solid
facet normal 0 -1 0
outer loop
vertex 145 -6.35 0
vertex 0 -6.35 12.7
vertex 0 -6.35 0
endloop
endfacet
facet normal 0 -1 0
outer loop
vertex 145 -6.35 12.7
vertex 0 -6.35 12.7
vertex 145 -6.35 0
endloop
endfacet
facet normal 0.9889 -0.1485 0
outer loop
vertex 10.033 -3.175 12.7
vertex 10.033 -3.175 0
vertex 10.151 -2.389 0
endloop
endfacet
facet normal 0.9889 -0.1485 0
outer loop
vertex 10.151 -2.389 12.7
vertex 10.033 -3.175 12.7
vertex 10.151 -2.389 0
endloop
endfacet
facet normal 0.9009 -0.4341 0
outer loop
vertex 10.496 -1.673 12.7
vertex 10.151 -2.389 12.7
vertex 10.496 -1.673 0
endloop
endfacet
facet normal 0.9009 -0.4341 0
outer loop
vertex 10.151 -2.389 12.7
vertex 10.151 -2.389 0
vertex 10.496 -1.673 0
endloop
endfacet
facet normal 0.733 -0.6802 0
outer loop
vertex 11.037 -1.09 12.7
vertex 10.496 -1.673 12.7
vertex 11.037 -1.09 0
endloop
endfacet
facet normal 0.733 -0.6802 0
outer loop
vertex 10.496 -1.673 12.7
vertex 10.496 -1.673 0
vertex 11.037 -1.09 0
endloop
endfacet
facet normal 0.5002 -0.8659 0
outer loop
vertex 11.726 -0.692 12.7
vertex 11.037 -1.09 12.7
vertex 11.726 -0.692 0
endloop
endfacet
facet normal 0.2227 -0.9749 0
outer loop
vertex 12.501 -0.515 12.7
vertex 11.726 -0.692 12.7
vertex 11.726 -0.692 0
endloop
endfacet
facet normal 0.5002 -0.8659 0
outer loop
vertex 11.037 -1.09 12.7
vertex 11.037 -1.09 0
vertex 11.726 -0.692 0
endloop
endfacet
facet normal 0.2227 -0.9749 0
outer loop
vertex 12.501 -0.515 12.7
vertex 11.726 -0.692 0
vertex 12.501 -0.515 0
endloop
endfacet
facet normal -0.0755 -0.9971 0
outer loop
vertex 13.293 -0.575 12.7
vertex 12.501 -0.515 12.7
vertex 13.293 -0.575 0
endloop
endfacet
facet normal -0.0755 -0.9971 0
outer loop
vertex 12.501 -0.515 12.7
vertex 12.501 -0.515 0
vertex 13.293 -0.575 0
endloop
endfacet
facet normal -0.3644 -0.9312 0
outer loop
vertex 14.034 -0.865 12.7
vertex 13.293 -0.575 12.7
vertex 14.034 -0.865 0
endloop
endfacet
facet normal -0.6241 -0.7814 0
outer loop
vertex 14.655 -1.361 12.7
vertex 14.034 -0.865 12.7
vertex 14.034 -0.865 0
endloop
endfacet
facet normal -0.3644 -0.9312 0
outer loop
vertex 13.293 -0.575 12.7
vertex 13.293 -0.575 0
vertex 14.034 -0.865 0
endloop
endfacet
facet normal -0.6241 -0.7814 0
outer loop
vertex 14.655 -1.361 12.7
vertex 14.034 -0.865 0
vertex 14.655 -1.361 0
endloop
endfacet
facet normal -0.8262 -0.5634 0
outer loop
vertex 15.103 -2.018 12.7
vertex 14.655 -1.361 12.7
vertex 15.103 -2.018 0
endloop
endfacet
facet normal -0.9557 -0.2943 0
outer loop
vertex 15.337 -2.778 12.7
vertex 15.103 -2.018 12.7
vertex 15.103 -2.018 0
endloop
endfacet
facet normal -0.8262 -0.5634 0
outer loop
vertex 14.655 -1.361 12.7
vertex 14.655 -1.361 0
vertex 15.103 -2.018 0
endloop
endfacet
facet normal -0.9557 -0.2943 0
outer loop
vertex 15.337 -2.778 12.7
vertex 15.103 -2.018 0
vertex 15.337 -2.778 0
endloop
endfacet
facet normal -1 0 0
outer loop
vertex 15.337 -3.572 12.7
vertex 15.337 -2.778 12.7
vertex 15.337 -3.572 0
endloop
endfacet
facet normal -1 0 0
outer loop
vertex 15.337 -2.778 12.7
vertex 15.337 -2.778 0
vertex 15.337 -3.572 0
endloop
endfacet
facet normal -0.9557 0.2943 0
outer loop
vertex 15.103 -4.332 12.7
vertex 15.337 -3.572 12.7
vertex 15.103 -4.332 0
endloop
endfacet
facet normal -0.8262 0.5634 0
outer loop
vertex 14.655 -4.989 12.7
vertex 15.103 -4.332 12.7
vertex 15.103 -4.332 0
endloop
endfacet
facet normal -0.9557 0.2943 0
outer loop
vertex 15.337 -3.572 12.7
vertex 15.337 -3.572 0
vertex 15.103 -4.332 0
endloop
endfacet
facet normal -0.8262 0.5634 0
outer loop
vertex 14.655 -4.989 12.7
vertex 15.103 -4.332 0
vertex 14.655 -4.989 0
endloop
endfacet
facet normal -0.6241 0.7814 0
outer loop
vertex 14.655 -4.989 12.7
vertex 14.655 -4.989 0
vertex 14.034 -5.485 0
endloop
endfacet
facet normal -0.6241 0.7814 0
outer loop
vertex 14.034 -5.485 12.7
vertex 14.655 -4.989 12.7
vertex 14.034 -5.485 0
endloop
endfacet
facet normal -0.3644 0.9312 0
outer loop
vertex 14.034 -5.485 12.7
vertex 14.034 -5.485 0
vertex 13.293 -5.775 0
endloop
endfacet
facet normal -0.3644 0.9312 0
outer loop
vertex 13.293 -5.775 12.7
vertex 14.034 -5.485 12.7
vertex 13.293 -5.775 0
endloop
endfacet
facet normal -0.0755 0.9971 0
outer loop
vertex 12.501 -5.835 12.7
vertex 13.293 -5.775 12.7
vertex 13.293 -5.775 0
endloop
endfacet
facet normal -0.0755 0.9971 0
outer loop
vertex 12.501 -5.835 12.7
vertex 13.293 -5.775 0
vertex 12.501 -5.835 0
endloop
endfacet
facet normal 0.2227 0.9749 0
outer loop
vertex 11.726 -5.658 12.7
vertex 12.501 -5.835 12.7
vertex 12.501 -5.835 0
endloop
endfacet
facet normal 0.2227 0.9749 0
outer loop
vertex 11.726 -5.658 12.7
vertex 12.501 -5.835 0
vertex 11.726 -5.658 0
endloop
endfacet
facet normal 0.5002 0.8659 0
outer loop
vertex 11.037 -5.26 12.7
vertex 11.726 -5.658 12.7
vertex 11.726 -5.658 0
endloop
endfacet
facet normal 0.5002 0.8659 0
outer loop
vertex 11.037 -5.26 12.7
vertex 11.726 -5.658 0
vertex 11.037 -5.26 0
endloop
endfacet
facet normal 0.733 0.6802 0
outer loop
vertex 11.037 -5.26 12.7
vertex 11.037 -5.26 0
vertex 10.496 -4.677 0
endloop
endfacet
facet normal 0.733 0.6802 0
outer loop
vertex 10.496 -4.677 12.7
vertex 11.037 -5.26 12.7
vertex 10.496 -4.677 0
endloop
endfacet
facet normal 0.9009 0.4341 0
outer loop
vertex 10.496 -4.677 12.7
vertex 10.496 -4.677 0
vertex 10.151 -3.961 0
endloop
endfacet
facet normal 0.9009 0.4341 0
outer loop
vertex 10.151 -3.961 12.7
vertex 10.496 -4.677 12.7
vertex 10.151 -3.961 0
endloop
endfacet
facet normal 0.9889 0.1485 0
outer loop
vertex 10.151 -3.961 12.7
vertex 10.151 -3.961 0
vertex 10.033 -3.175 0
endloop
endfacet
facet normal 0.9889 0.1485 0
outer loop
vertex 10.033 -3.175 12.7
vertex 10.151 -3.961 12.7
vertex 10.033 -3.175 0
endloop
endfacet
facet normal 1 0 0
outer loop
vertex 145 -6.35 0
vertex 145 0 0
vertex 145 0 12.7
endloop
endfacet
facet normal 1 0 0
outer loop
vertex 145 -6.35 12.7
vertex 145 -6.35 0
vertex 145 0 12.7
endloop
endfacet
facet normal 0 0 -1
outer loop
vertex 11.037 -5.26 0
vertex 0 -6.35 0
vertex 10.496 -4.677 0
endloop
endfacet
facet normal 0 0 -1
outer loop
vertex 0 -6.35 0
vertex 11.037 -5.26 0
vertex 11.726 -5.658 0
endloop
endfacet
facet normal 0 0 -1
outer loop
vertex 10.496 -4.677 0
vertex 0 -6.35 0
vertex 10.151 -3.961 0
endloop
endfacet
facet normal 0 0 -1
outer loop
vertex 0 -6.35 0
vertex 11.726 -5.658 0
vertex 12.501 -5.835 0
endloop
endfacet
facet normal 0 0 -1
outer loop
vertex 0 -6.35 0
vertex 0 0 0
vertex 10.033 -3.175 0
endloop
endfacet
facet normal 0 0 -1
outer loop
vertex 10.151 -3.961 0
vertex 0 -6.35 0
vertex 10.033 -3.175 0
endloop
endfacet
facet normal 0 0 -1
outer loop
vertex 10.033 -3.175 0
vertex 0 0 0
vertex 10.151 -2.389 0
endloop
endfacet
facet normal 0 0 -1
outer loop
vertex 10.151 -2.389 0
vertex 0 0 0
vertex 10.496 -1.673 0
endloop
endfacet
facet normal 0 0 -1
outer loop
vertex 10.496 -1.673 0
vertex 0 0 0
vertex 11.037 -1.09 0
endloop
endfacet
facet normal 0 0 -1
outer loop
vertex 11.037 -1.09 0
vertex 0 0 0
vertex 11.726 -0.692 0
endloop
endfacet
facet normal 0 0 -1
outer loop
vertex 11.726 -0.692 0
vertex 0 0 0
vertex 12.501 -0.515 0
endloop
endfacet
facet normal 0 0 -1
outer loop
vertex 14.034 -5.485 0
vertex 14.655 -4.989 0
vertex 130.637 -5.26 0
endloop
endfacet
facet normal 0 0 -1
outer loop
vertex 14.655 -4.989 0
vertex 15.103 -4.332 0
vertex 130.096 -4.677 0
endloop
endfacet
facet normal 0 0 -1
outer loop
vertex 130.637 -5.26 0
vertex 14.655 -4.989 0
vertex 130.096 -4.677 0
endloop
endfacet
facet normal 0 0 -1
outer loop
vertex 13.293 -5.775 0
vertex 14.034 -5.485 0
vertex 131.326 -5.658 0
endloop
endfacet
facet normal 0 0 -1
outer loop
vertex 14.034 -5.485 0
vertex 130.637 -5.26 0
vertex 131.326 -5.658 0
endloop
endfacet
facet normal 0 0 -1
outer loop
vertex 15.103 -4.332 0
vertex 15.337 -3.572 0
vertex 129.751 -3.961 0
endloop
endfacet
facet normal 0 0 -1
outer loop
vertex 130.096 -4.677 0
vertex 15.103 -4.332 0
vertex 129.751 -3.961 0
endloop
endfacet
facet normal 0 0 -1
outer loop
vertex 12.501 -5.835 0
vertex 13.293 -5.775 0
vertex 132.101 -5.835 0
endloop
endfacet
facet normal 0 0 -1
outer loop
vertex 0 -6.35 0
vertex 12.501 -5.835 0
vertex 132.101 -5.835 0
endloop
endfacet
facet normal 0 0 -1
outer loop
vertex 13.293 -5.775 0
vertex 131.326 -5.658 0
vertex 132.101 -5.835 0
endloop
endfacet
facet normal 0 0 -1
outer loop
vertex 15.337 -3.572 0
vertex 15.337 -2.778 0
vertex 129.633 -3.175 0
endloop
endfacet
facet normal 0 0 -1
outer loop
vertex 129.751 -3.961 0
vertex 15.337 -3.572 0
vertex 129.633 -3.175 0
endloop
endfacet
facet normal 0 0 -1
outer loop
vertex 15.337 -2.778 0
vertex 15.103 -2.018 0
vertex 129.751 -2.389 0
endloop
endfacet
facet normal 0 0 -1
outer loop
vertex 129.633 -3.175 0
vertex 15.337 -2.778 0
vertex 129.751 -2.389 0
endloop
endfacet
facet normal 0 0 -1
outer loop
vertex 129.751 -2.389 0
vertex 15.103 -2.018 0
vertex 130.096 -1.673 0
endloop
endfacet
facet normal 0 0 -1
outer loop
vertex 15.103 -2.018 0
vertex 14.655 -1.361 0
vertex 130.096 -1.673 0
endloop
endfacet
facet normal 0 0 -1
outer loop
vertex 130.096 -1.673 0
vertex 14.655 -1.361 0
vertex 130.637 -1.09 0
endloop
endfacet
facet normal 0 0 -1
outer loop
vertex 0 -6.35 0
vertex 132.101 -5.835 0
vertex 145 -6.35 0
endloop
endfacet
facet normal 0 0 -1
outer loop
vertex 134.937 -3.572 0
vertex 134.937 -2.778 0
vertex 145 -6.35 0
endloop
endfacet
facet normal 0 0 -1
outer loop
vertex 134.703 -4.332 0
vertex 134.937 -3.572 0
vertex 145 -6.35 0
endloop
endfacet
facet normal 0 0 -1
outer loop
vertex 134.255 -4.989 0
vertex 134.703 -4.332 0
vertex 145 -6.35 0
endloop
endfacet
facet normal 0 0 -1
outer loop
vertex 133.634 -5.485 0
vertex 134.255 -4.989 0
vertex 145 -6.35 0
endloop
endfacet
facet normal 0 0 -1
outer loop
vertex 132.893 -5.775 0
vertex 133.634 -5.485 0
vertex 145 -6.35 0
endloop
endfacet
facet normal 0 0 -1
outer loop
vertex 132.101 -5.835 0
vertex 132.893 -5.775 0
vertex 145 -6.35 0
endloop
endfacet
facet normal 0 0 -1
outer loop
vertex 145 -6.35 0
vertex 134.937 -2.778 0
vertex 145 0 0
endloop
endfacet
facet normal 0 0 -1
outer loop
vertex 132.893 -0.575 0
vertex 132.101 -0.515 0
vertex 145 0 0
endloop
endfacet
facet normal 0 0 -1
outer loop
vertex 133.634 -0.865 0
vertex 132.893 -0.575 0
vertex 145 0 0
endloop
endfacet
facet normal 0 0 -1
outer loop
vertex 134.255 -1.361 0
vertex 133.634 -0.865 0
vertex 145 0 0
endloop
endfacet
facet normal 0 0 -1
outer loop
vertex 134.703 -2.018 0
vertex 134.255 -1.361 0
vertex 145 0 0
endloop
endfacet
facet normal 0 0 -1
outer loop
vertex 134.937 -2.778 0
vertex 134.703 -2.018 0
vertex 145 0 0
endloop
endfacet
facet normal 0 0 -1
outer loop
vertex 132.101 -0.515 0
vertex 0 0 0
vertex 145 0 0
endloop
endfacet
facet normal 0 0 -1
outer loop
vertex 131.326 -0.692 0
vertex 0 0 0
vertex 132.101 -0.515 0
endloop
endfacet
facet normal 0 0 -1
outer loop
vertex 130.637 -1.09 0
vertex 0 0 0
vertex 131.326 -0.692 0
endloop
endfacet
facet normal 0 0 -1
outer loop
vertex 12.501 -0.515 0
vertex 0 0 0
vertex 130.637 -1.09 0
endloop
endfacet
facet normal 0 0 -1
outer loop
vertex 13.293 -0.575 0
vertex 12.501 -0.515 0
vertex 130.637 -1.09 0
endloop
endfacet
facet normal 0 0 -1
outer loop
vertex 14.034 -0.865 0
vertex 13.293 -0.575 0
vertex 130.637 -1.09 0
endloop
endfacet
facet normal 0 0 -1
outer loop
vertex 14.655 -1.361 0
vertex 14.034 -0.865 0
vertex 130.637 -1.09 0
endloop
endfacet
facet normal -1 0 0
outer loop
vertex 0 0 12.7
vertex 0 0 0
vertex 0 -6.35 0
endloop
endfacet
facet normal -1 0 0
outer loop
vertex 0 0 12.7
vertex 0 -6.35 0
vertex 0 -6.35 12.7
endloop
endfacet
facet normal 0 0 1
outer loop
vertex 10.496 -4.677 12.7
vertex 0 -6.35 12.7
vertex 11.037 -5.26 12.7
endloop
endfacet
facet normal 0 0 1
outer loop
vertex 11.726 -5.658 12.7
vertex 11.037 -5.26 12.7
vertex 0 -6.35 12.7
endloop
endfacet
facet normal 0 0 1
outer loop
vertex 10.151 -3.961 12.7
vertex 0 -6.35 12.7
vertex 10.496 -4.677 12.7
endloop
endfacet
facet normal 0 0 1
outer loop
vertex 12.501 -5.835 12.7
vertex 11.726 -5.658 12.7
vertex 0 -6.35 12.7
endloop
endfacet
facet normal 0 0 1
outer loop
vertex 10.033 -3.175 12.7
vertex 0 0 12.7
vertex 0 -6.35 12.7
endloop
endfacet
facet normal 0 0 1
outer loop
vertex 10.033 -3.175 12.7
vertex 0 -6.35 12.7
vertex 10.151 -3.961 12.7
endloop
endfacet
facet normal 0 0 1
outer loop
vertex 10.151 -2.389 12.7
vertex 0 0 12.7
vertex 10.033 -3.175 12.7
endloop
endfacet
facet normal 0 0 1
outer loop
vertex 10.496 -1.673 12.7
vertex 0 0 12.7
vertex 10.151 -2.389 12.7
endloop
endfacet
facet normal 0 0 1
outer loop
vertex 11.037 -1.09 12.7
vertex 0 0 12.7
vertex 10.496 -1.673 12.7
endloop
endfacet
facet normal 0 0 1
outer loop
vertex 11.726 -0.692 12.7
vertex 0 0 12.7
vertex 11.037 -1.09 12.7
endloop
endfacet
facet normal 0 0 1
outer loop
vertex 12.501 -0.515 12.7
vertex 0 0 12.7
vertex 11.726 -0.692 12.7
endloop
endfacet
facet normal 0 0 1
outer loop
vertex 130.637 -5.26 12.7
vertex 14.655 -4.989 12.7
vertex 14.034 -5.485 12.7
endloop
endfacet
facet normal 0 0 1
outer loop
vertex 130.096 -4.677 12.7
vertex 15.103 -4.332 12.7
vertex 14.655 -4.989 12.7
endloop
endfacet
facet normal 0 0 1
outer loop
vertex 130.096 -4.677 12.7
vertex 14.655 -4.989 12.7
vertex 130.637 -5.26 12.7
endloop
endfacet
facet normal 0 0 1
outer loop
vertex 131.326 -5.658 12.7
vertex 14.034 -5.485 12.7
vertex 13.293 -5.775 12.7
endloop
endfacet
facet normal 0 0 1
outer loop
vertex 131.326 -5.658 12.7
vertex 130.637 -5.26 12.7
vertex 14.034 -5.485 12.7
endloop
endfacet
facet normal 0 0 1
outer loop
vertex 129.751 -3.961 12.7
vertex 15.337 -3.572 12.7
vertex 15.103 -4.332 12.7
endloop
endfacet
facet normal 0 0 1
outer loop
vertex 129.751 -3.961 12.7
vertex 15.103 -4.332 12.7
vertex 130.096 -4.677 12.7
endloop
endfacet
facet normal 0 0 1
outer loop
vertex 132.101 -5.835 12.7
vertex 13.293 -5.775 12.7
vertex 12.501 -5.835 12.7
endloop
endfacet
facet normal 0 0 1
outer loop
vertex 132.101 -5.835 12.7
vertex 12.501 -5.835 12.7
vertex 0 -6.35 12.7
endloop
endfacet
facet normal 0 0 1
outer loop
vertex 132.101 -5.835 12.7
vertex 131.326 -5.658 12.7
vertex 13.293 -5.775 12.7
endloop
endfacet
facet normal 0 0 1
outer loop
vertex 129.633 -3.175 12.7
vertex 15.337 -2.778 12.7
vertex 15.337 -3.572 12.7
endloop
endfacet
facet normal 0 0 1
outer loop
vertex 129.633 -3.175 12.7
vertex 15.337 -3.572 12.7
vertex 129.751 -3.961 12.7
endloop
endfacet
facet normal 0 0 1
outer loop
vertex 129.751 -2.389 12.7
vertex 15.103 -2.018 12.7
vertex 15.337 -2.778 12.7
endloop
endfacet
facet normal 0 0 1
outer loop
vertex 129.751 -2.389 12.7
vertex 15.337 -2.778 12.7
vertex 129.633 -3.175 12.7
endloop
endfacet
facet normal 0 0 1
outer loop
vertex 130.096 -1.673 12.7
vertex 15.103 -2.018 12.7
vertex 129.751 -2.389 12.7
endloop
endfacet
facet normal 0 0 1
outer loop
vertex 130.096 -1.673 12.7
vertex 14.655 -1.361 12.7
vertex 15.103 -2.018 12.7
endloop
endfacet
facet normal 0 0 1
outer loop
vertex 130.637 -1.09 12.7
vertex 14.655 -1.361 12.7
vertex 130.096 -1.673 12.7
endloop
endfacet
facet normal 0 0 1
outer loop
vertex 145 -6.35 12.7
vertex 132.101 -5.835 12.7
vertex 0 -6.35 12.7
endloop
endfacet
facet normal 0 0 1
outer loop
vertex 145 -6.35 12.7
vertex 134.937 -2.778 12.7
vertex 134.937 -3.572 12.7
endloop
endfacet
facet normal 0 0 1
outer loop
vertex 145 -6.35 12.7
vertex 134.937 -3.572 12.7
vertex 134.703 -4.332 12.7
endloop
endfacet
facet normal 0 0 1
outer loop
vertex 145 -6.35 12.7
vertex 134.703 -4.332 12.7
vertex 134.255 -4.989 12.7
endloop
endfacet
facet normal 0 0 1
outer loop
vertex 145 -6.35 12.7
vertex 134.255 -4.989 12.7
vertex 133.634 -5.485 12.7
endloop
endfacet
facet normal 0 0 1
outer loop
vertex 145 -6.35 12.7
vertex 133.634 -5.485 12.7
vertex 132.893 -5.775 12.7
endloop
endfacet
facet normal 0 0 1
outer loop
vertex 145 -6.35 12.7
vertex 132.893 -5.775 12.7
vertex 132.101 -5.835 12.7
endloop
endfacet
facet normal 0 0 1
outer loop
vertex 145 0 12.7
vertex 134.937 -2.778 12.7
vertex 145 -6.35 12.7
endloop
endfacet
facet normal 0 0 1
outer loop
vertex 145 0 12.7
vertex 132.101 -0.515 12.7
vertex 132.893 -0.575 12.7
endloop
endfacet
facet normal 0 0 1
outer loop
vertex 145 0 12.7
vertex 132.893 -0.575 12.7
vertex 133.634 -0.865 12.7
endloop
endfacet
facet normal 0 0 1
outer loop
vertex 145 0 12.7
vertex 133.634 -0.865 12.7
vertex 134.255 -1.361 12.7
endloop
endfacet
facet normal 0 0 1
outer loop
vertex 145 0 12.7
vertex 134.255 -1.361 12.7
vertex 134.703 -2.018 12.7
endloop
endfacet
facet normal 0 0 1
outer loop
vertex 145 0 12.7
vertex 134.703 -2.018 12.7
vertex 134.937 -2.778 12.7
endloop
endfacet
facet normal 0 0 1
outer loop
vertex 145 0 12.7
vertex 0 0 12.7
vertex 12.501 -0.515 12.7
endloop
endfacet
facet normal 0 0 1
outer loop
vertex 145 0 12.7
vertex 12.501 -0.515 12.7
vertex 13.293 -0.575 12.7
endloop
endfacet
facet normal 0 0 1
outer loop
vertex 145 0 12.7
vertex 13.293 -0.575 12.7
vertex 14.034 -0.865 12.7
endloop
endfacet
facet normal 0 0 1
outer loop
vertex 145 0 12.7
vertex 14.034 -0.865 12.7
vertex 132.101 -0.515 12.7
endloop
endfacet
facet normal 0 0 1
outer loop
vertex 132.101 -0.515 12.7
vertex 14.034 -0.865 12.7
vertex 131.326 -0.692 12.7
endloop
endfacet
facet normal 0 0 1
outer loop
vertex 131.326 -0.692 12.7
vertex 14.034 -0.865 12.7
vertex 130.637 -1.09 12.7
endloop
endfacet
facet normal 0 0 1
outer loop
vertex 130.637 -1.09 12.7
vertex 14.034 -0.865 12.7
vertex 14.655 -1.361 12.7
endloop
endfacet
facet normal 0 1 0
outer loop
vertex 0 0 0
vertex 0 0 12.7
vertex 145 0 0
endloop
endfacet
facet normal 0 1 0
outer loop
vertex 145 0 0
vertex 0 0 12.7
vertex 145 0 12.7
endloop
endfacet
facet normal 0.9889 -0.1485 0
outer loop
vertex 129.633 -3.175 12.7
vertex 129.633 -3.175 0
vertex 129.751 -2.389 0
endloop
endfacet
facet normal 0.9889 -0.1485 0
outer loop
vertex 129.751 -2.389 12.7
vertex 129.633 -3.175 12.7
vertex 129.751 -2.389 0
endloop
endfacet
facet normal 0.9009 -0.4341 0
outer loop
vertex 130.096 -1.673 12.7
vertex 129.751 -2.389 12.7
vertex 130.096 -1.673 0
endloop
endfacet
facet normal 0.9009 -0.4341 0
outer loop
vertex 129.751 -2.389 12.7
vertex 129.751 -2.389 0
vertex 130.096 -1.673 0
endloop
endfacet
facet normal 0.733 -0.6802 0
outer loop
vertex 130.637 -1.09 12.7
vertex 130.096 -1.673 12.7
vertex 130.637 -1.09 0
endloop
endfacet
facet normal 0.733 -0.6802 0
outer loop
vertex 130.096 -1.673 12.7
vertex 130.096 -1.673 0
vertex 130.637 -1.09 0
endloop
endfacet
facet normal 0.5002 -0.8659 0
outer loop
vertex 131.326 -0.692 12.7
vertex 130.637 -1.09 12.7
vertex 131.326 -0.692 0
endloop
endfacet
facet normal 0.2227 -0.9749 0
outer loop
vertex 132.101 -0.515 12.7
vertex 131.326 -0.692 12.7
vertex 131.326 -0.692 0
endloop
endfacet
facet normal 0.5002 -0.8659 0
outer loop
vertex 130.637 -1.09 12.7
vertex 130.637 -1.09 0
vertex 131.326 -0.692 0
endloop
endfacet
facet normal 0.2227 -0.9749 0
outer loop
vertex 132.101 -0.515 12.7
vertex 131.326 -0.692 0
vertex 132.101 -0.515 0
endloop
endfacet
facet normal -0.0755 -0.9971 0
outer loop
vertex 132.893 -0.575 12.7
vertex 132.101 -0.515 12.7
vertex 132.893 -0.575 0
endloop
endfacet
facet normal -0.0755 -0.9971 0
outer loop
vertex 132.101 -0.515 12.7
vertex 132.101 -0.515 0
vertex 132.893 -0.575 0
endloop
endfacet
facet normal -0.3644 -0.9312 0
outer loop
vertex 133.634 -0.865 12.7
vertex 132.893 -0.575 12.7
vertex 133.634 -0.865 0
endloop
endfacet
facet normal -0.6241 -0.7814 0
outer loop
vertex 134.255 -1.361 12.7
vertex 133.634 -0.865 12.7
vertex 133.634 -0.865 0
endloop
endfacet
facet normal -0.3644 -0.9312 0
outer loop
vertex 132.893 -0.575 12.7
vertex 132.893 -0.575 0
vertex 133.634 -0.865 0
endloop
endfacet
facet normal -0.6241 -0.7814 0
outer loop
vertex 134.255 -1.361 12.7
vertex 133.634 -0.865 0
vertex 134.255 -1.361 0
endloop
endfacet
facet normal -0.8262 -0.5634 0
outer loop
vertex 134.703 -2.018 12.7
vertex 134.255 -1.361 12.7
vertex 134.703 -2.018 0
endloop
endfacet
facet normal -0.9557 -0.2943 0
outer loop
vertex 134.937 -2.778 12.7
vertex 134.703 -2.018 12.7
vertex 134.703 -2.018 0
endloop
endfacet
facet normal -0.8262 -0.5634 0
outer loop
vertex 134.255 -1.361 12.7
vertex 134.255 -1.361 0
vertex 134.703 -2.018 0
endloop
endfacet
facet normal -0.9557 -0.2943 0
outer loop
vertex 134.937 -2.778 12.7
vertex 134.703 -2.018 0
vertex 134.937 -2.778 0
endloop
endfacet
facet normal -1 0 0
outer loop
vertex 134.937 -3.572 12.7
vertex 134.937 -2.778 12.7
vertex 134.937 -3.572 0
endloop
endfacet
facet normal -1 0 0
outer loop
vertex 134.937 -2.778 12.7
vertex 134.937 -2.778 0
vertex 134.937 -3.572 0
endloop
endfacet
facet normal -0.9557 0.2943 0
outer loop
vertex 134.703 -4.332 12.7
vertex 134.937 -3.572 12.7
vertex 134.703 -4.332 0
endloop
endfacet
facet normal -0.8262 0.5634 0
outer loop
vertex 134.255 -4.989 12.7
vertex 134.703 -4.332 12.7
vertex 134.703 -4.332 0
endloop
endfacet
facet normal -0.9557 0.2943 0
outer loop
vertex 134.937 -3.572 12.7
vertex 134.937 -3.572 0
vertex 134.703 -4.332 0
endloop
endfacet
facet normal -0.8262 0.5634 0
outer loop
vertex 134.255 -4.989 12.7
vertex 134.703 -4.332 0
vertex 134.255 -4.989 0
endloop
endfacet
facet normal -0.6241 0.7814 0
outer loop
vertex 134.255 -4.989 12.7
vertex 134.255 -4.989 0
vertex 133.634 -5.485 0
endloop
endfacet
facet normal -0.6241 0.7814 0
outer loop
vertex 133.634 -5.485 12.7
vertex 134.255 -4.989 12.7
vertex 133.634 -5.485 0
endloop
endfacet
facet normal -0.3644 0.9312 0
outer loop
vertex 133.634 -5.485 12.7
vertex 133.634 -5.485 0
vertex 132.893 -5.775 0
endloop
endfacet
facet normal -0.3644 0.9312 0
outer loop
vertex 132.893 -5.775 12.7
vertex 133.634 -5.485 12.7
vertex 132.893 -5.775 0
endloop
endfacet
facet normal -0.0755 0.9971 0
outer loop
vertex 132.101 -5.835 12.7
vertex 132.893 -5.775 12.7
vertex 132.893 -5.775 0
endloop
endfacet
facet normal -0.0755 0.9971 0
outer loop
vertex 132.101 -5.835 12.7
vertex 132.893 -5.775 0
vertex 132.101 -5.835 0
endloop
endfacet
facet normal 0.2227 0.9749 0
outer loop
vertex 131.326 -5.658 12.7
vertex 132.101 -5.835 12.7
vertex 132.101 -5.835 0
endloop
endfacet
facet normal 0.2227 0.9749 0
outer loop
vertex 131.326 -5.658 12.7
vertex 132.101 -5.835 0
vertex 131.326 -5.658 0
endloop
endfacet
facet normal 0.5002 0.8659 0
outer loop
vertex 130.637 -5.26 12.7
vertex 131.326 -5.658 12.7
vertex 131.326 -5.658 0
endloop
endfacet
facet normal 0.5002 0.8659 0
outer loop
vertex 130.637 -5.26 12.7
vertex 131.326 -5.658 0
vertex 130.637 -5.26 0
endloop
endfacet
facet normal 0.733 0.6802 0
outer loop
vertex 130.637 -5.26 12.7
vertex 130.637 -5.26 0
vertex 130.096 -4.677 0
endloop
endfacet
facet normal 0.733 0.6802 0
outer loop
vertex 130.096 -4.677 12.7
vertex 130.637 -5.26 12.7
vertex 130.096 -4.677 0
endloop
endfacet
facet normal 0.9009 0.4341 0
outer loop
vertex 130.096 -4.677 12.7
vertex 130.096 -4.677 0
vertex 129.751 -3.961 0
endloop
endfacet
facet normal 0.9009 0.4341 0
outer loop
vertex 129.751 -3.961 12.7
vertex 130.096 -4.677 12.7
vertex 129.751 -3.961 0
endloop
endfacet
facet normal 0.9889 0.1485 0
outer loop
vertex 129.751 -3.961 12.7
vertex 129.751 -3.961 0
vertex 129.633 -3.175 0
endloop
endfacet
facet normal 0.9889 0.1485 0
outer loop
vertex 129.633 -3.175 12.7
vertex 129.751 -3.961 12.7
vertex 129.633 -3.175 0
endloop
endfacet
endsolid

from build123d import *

# Parameters (mm, degrees)
F0_W     = 145
F0_H     = 12.7
F1_DEPTH = 6.35
F3_D     = 5.334
F3_DEPTH = 12.7


with BuildPart() as f1:
    # F0 (on Front) → F1 (new body)
    with BuildSketch(Plane.XZ):
        with Locations((72.5, 6.35)):
            Rectangle(F0_W, F0_H)
    extrude(amount=F1_DEPTH)

    # F3
    with Locations(Plane.XY.offset(12.7)):
        with Locations((12.7, -3.175), (132.3, -3.175)):
            Hole(F3_D / 2, depth=F3_DEPTH)


solid = f1.part
